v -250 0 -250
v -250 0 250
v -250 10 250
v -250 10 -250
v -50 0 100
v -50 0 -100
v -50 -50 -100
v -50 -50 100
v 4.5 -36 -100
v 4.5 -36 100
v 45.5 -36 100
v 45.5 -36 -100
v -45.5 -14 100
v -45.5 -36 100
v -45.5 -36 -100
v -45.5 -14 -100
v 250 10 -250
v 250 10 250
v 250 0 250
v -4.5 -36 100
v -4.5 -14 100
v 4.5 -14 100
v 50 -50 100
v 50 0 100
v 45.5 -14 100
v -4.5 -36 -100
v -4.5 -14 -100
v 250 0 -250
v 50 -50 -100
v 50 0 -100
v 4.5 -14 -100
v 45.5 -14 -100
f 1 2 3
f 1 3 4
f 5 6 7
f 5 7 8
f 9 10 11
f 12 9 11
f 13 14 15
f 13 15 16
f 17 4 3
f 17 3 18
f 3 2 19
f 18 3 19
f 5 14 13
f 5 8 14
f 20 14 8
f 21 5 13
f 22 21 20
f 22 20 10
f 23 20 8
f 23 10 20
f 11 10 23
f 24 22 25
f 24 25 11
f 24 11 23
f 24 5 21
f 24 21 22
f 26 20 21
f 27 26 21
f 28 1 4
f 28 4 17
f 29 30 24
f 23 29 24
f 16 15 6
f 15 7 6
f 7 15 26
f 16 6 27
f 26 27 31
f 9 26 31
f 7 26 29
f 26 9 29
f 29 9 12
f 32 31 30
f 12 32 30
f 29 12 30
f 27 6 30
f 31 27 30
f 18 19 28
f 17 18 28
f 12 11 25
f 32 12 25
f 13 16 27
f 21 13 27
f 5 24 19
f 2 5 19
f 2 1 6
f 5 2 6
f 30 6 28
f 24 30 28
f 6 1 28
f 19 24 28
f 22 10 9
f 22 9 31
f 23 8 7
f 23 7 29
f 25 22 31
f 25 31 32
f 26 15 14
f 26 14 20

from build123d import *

# Parameters (mm, degrees)
SKETCH1_W           = 500
SKETCH1_H           = 500
BOSS_EXTRUDE1_DEPTH = 10
SKETCH2_W           = 100
SKETCH2_H           = 200
BOSS_EXTRUDE2_DEPTH = 50
CUT_EXTRUDE1_REACH  = 435.013
SKETCH3_W           = 41
SKETCH3_H           = 22


with BuildPart() as part:
    # Sketch1 → Boss-Extrude1 (new body)
    with BuildSketch(Plane(origin=(0, 0, 0), x_dir=(1, 0, 0), z_dir=(0, 1, 0))):
        Rectangle(SKETCH1_W, SKETCH1_H)
    extrude(amount=BOSS_EXTRUDE1_DEPTH)

    # Sketch2 → Boss-Extrude2 (add)
    with BuildSketch(Plane.XZ):
        Rectangle(SKETCH2_W, SKETCH2_H)
    extrude(amount=BOSS_EXTRUDE2_DEPTH)

    # Sketch3 → Cut-Extrude1 (cut, up to next)
    with BuildSketch(Plane.XY.offset(100), mode=Mode.PRIVATE) as cut_extrude1_sk1:
        with Locations((-25, -25)):
            Rectangle(SKETCH3_W, SKETCH3_H)
    cut_extrude1_tool1 = extrude(cut_extrude1_sk1.sketch, amount=-CUT_EXTRUDE1_REACH, mode=Mode.PRIVATE) & part.part
    # Sketch3 → Cut-Extrude1 (cut, up to next)
    with BuildSketch(Plane.XY.offset(100), mode=Mode.PRIVATE) as cut_extrude1_sk2:
        with Locations((25, -25)):
            Rectangle(SKETCH3_W, SKETCH3_H)
    cut_extrude1_tool2 = extrude(cut_extrude1_sk2.sketch, amount=-CUT_EXTRUDE1_REACH, mode=Mode.PRIVATE) & part.part
    add(cut_extrude1_tool1.solids().sort_by_distance((-25, -25, 100))[0], mode=Mode.SUBTRACT)
    add(cut_extrude1_tool2.solids().sort_by_distance((25, -25, 100))[0], mode=Mode.SUBTRACT)


solid = part.part
